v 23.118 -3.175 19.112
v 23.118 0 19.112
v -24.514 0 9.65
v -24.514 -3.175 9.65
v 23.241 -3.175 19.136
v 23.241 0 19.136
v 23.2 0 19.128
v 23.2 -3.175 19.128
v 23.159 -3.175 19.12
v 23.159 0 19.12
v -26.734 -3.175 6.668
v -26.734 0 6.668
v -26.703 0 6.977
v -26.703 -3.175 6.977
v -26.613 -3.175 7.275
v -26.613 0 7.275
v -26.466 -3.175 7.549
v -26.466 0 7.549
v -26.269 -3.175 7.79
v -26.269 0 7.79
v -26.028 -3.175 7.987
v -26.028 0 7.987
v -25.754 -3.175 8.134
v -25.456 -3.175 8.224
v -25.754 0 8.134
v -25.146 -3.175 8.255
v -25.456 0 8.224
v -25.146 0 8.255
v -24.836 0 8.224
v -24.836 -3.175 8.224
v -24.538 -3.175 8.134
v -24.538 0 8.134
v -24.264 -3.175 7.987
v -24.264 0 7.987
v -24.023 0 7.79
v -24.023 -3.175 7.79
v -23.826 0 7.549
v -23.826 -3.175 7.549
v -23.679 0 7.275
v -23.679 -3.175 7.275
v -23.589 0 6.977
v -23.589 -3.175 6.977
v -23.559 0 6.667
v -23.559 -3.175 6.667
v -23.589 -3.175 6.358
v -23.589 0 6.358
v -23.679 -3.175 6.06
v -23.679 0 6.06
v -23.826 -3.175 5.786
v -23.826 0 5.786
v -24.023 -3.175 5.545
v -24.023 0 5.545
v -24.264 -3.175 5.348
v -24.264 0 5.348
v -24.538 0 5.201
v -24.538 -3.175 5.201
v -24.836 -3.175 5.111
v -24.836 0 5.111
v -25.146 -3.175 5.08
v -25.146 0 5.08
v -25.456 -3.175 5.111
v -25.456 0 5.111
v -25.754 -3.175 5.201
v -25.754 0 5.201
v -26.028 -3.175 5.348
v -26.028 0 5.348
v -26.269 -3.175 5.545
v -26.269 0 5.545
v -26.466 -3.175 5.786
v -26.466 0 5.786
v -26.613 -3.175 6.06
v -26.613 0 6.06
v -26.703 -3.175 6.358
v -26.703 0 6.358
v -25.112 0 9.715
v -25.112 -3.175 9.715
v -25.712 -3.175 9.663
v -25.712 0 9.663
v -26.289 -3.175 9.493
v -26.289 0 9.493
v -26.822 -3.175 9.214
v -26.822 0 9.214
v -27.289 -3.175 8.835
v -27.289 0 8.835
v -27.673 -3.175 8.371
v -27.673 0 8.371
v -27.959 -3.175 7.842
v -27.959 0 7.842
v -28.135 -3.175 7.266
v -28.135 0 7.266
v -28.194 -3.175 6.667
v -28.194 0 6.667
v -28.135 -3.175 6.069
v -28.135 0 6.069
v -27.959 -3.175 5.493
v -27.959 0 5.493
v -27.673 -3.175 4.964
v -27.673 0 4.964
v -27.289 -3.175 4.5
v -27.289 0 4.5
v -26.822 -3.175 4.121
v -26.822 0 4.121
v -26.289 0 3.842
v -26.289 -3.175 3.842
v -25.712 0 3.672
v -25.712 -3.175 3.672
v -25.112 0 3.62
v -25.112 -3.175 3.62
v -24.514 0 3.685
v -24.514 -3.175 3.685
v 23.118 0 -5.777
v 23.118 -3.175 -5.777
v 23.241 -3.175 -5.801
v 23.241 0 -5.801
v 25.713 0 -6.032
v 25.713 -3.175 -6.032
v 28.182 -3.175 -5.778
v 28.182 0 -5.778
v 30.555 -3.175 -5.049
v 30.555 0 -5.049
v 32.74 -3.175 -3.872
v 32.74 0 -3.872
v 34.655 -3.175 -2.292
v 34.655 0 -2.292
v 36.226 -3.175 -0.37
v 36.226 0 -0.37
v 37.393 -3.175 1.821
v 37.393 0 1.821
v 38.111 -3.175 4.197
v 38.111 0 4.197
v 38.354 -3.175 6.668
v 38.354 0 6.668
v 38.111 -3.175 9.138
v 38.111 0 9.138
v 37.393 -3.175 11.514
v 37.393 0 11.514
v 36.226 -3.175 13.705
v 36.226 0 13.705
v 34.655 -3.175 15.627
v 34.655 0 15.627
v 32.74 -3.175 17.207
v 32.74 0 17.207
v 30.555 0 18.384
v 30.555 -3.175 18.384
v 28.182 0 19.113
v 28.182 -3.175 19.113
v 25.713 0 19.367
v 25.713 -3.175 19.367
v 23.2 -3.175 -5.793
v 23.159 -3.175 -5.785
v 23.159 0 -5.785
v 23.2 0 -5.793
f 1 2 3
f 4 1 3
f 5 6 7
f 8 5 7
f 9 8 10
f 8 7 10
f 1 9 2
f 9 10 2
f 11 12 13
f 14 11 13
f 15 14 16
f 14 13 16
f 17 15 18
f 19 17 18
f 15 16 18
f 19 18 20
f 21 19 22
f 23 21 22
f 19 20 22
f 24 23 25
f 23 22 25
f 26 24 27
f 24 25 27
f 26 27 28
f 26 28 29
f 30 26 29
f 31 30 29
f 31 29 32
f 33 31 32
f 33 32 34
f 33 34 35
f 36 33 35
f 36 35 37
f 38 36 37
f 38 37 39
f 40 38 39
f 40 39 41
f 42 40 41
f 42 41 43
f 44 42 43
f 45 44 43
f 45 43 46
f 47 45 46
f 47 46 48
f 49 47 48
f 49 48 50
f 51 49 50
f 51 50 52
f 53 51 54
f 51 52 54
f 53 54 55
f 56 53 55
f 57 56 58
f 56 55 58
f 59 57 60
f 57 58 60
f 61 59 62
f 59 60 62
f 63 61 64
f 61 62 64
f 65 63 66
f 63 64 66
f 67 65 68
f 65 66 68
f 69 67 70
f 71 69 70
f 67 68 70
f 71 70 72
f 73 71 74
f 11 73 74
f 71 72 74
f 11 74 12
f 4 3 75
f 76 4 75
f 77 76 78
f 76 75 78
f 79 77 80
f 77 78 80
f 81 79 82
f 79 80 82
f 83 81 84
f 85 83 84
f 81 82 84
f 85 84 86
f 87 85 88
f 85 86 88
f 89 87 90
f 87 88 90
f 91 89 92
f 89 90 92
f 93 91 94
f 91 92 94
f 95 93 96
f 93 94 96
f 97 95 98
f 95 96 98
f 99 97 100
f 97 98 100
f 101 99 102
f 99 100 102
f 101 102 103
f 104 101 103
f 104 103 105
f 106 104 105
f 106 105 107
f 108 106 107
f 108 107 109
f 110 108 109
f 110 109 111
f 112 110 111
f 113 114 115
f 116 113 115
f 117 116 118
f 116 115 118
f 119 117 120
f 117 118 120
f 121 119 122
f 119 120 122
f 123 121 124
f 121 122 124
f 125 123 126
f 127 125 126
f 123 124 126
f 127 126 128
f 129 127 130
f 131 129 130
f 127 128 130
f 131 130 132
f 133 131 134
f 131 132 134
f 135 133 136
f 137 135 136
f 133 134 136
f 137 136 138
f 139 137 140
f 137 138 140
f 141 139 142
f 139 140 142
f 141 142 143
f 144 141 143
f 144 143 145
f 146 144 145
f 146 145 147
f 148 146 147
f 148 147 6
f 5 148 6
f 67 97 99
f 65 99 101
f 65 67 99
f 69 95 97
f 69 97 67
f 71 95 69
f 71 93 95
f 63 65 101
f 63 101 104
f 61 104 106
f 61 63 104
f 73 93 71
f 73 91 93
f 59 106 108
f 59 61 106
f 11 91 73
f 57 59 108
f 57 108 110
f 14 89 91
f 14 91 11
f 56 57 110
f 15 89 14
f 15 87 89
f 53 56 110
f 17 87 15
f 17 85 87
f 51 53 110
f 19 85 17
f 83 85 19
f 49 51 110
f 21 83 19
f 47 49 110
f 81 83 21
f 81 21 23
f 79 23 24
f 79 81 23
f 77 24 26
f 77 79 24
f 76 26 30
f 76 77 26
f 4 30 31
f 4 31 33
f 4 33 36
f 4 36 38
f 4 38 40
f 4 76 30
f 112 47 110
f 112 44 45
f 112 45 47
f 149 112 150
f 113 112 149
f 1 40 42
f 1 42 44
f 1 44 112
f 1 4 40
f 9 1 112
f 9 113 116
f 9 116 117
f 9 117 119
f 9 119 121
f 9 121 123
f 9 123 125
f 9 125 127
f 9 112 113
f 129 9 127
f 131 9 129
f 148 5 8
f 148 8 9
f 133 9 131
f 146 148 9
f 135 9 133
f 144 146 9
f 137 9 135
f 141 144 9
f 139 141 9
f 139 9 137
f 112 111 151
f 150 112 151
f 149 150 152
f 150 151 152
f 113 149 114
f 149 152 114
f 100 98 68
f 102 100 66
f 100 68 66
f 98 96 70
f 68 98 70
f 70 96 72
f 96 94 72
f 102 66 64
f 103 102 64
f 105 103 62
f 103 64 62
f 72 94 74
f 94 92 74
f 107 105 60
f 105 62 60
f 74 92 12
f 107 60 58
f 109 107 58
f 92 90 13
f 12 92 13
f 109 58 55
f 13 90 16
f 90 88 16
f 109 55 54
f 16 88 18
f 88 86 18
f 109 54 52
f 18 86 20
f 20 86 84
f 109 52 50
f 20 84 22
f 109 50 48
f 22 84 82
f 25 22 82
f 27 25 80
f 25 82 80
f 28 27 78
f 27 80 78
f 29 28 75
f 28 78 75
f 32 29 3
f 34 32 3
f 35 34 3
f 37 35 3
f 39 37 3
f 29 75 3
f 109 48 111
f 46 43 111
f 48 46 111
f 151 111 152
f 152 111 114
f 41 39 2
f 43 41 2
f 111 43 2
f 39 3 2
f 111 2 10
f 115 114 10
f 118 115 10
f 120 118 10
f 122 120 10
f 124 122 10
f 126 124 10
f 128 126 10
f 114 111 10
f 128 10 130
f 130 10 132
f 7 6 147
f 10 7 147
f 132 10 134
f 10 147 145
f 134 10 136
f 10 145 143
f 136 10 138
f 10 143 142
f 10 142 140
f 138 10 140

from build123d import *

# Parameters (mm, degrees)
F1_DEPTH = 3.175
F3_D     = 3.175


with BuildPart() as f1:
    # F0 (on Front) → F1 (new body)
    with BuildSketch(Plane.XZ):
        with BuildLine():
            Line((23.241043, -5.801166), (23.117982, -5.77672))
            ThreePointArc((23.117982, -5.77672), (23.179482, -5.789095), (23.241043, -5.801166))
        make_face()
        with BuildLine():
            Line((-24.51433, 3.685497), (23.117982, -5.77672))
            Line((23.117982, -5.77672), (23.241043, -5.801166))
            ThreePointArc((23.241043, -5.801166), (38.354, 6.6675), (23.241043, 19.136167))
            Line((23.241043, 19.136167), (23.117982, 19.11172))
            Line((23.117982, 19.11172), (-24.51433, 9.649503))
            ThreePointArc((-24.51433, 9.649503), (-28.194172, 6.6675), (-24.51433, 3.685497))
        make_face()
        with BuildLine():
            Line((23.117982, 19.11172), (23.241043, 19.136167))
            ThreePointArc((23.241043, 19.136167), (23.179482, 19.124095), (23.117982, 19.11172))
        make_face()
    extrude(amount=F1_DEPTH)

    # F3 (through all)
    with Locations(Plane.XZ.offset(3.175)):
        with Locations((-25.146, 6.6675)):
            Hole(F3_D / 2)


solid = f1.part
